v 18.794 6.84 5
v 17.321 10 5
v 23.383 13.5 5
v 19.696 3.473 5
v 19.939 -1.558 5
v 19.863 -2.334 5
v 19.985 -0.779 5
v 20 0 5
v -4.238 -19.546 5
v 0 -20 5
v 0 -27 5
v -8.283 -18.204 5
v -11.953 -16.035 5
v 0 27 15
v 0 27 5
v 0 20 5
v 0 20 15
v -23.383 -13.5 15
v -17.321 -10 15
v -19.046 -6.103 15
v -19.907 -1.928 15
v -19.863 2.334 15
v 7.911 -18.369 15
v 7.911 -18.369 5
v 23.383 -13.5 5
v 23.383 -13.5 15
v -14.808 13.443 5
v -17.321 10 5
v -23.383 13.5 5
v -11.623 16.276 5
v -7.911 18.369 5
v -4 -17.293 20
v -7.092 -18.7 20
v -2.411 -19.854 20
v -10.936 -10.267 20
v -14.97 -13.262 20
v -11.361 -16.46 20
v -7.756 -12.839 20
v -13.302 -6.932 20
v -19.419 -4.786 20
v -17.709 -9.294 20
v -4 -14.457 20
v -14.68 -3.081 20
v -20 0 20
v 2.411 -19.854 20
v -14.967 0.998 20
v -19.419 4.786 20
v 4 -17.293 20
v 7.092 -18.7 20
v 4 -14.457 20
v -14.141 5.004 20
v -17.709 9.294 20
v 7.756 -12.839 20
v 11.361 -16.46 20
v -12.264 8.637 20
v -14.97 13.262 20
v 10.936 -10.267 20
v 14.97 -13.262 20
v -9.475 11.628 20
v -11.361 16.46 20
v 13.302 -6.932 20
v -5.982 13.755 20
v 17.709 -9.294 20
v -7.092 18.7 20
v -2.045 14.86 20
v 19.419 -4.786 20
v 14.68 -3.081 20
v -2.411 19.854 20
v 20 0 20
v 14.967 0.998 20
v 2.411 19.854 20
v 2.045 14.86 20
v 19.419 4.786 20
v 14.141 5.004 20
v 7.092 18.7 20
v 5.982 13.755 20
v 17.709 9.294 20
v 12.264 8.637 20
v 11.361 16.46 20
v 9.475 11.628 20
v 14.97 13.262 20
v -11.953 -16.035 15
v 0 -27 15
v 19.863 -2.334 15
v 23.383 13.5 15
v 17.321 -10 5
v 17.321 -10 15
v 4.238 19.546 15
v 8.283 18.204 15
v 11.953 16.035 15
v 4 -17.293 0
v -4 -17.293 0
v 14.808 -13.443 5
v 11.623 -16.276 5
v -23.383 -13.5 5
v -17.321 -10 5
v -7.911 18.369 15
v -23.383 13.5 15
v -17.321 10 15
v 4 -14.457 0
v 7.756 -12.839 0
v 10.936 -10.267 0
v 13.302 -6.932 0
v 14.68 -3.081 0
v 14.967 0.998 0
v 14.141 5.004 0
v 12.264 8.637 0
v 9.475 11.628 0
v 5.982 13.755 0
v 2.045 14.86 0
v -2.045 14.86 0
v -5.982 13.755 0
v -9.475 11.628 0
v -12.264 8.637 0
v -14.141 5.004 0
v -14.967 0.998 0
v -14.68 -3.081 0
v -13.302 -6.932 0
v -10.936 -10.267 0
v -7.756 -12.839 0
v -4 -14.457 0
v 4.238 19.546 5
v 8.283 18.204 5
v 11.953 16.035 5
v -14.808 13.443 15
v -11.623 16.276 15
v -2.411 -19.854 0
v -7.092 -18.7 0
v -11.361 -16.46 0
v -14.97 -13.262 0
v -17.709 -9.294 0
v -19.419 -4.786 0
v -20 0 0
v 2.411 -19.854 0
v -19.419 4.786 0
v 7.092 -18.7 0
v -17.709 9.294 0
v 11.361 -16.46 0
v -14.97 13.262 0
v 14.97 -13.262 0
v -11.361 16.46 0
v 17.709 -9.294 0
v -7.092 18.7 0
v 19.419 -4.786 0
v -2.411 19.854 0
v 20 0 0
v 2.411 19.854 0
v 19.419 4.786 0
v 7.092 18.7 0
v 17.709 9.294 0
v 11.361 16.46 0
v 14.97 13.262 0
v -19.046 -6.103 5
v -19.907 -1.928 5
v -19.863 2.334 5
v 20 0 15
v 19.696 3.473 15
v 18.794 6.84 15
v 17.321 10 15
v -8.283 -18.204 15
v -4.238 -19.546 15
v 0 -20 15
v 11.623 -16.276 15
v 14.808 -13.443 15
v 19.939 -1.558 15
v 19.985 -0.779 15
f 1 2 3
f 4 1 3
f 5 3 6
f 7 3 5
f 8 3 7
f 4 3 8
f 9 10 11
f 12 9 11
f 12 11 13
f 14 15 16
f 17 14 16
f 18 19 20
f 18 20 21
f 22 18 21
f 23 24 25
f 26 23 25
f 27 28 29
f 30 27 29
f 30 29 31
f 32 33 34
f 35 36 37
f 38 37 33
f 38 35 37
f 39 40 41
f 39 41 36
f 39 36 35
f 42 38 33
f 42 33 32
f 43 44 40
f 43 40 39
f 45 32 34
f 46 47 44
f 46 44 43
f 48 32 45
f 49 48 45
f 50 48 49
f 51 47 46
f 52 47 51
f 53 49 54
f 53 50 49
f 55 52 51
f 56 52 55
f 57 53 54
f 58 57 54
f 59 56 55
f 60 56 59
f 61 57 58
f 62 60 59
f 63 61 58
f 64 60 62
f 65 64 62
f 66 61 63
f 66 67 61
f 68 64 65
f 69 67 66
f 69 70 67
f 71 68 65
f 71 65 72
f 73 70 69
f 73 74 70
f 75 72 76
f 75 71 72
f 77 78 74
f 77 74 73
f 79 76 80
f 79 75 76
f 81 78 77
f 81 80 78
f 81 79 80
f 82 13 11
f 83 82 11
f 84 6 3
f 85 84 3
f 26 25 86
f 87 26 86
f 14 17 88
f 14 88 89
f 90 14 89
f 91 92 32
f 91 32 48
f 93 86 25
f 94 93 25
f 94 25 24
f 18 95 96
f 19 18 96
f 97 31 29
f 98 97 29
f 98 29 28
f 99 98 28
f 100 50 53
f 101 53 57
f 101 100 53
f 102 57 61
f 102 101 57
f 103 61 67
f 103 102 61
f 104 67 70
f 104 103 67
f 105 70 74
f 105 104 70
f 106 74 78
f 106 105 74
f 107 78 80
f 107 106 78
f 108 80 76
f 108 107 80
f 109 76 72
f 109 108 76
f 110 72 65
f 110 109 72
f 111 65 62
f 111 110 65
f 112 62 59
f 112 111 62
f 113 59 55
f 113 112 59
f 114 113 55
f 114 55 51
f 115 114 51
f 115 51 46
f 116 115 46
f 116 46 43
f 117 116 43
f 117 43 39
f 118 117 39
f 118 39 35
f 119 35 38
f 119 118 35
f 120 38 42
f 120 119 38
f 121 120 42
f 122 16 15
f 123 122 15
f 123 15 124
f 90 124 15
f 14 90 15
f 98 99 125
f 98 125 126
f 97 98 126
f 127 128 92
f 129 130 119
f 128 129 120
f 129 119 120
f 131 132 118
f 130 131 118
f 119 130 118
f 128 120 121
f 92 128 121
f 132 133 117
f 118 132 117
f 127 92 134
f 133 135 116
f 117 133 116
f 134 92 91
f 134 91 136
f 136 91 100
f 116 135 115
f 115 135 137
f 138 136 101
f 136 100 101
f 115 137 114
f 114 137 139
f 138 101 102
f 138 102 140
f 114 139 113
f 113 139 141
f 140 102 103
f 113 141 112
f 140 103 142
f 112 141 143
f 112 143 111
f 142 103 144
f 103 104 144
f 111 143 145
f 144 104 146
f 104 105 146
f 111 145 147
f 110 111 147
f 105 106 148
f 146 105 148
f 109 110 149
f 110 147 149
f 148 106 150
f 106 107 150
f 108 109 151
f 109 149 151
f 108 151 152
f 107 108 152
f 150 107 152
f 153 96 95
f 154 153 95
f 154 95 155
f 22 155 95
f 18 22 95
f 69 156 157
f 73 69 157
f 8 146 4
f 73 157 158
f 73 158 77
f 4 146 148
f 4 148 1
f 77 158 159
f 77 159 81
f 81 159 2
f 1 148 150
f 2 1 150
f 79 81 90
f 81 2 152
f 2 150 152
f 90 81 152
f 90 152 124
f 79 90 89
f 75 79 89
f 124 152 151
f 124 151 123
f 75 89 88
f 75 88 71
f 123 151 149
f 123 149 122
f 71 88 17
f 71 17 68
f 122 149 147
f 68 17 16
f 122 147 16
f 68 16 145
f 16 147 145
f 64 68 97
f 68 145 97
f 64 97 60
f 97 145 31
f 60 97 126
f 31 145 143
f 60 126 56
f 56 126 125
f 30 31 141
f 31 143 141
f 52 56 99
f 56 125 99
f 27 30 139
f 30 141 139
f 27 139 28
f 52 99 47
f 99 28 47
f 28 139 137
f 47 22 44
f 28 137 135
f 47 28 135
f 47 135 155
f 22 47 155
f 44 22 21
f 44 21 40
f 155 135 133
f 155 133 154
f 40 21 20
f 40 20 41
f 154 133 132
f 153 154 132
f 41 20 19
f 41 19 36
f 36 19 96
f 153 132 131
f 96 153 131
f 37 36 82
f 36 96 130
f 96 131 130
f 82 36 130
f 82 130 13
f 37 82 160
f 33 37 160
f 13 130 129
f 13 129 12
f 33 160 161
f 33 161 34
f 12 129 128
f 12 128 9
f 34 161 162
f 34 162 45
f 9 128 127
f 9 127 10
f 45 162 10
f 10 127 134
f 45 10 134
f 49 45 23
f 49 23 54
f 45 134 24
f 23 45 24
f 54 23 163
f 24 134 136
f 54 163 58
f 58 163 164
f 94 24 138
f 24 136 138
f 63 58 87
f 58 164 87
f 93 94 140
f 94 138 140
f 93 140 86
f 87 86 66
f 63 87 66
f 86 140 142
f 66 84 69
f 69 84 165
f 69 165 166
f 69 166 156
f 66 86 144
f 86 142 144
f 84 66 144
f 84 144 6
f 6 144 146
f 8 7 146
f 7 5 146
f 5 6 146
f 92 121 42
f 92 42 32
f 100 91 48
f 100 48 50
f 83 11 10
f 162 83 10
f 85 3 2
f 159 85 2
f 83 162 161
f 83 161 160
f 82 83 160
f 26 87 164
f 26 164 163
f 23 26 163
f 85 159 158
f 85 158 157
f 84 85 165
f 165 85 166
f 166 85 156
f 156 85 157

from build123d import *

# Parameters (mm, degrees)
SKETCH1_R               = 20
SKETCH1_R_2             = 15
BOSS_EXTRUDE1_DEPTH     = 20
CUT_EXTRUDE2_DEPTH      = 21
CUT_EXTRUDE2_DEPTH_BACK = 1
BOSS_EXTRUDE16_DEPTH    = 10
CIRPATTERN2_COUNT       = 6


with BuildPart() as part:
    # Sketch1 → Boss-Extrude1 (new body)
    with BuildSketch(Plane.XY):
        Circle(SKETCH1_R)
        Circle(SKETCH1_R_2, mode=Mode.SUBTRACT)
    extrude(amount=BOSS_EXTRUDE1_DEPTH)

    # Sketch5 → Cut-Extrude2 (cut, two sides)
    with BuildSketch(Plane.XY) as cut_extrude2_sk:
        with BuildLine():
            Line((-4, -17.293255897), (0, -17.293255897))
            Line((0, -17.293255897), (4, -17.293255897))
            Line((4, -17.293255897), (4, -14.456832295))
            ThreePointArc((4, -14.456832295), (0, -15), (-4, -14.456832295))
            Line((-4, -14.456832295), (-4, -17.293255897))
        make_face()
    extrude(amount=CUT_EXTRUDE2_DEPTH, mode=Mode.SUBTRACT)
    extrude(cut_extrude2_sk.sketch, amount=-CUT_EXTRUDE2_DEPTH_BACK, mode=Mode.SUBTRACT)

    # Sketch18 → Boss-Extrude16 (add)
    with BuildSketch(Plane.XY.offset(5)):
        with BuildLine():
            Line((0, 27), (0, 20))
            ThreePointArc((0, 20), (6.296505517, 18.982992869), (11.952651932, 16.035401828))
            Line((11.952651932, 16.035401828), (0, 27))
        make_face()
    boss_extrude16 = extrude(amount=BOSS_EXTRUDE16_DEPTH)

    # CirPattern2: Boss-Extrude16 ×6 about axis
    cirpattern2_axis = Axis((0, 0, 0), (0, 0, 1))
    for i in range(1, CIRPATTERN2_COUNT):
        add(boss_extrude16.rotate(cirpattern2_axis, i * 360 / CIRPATTERN2_COUNT))


solid = part.part
